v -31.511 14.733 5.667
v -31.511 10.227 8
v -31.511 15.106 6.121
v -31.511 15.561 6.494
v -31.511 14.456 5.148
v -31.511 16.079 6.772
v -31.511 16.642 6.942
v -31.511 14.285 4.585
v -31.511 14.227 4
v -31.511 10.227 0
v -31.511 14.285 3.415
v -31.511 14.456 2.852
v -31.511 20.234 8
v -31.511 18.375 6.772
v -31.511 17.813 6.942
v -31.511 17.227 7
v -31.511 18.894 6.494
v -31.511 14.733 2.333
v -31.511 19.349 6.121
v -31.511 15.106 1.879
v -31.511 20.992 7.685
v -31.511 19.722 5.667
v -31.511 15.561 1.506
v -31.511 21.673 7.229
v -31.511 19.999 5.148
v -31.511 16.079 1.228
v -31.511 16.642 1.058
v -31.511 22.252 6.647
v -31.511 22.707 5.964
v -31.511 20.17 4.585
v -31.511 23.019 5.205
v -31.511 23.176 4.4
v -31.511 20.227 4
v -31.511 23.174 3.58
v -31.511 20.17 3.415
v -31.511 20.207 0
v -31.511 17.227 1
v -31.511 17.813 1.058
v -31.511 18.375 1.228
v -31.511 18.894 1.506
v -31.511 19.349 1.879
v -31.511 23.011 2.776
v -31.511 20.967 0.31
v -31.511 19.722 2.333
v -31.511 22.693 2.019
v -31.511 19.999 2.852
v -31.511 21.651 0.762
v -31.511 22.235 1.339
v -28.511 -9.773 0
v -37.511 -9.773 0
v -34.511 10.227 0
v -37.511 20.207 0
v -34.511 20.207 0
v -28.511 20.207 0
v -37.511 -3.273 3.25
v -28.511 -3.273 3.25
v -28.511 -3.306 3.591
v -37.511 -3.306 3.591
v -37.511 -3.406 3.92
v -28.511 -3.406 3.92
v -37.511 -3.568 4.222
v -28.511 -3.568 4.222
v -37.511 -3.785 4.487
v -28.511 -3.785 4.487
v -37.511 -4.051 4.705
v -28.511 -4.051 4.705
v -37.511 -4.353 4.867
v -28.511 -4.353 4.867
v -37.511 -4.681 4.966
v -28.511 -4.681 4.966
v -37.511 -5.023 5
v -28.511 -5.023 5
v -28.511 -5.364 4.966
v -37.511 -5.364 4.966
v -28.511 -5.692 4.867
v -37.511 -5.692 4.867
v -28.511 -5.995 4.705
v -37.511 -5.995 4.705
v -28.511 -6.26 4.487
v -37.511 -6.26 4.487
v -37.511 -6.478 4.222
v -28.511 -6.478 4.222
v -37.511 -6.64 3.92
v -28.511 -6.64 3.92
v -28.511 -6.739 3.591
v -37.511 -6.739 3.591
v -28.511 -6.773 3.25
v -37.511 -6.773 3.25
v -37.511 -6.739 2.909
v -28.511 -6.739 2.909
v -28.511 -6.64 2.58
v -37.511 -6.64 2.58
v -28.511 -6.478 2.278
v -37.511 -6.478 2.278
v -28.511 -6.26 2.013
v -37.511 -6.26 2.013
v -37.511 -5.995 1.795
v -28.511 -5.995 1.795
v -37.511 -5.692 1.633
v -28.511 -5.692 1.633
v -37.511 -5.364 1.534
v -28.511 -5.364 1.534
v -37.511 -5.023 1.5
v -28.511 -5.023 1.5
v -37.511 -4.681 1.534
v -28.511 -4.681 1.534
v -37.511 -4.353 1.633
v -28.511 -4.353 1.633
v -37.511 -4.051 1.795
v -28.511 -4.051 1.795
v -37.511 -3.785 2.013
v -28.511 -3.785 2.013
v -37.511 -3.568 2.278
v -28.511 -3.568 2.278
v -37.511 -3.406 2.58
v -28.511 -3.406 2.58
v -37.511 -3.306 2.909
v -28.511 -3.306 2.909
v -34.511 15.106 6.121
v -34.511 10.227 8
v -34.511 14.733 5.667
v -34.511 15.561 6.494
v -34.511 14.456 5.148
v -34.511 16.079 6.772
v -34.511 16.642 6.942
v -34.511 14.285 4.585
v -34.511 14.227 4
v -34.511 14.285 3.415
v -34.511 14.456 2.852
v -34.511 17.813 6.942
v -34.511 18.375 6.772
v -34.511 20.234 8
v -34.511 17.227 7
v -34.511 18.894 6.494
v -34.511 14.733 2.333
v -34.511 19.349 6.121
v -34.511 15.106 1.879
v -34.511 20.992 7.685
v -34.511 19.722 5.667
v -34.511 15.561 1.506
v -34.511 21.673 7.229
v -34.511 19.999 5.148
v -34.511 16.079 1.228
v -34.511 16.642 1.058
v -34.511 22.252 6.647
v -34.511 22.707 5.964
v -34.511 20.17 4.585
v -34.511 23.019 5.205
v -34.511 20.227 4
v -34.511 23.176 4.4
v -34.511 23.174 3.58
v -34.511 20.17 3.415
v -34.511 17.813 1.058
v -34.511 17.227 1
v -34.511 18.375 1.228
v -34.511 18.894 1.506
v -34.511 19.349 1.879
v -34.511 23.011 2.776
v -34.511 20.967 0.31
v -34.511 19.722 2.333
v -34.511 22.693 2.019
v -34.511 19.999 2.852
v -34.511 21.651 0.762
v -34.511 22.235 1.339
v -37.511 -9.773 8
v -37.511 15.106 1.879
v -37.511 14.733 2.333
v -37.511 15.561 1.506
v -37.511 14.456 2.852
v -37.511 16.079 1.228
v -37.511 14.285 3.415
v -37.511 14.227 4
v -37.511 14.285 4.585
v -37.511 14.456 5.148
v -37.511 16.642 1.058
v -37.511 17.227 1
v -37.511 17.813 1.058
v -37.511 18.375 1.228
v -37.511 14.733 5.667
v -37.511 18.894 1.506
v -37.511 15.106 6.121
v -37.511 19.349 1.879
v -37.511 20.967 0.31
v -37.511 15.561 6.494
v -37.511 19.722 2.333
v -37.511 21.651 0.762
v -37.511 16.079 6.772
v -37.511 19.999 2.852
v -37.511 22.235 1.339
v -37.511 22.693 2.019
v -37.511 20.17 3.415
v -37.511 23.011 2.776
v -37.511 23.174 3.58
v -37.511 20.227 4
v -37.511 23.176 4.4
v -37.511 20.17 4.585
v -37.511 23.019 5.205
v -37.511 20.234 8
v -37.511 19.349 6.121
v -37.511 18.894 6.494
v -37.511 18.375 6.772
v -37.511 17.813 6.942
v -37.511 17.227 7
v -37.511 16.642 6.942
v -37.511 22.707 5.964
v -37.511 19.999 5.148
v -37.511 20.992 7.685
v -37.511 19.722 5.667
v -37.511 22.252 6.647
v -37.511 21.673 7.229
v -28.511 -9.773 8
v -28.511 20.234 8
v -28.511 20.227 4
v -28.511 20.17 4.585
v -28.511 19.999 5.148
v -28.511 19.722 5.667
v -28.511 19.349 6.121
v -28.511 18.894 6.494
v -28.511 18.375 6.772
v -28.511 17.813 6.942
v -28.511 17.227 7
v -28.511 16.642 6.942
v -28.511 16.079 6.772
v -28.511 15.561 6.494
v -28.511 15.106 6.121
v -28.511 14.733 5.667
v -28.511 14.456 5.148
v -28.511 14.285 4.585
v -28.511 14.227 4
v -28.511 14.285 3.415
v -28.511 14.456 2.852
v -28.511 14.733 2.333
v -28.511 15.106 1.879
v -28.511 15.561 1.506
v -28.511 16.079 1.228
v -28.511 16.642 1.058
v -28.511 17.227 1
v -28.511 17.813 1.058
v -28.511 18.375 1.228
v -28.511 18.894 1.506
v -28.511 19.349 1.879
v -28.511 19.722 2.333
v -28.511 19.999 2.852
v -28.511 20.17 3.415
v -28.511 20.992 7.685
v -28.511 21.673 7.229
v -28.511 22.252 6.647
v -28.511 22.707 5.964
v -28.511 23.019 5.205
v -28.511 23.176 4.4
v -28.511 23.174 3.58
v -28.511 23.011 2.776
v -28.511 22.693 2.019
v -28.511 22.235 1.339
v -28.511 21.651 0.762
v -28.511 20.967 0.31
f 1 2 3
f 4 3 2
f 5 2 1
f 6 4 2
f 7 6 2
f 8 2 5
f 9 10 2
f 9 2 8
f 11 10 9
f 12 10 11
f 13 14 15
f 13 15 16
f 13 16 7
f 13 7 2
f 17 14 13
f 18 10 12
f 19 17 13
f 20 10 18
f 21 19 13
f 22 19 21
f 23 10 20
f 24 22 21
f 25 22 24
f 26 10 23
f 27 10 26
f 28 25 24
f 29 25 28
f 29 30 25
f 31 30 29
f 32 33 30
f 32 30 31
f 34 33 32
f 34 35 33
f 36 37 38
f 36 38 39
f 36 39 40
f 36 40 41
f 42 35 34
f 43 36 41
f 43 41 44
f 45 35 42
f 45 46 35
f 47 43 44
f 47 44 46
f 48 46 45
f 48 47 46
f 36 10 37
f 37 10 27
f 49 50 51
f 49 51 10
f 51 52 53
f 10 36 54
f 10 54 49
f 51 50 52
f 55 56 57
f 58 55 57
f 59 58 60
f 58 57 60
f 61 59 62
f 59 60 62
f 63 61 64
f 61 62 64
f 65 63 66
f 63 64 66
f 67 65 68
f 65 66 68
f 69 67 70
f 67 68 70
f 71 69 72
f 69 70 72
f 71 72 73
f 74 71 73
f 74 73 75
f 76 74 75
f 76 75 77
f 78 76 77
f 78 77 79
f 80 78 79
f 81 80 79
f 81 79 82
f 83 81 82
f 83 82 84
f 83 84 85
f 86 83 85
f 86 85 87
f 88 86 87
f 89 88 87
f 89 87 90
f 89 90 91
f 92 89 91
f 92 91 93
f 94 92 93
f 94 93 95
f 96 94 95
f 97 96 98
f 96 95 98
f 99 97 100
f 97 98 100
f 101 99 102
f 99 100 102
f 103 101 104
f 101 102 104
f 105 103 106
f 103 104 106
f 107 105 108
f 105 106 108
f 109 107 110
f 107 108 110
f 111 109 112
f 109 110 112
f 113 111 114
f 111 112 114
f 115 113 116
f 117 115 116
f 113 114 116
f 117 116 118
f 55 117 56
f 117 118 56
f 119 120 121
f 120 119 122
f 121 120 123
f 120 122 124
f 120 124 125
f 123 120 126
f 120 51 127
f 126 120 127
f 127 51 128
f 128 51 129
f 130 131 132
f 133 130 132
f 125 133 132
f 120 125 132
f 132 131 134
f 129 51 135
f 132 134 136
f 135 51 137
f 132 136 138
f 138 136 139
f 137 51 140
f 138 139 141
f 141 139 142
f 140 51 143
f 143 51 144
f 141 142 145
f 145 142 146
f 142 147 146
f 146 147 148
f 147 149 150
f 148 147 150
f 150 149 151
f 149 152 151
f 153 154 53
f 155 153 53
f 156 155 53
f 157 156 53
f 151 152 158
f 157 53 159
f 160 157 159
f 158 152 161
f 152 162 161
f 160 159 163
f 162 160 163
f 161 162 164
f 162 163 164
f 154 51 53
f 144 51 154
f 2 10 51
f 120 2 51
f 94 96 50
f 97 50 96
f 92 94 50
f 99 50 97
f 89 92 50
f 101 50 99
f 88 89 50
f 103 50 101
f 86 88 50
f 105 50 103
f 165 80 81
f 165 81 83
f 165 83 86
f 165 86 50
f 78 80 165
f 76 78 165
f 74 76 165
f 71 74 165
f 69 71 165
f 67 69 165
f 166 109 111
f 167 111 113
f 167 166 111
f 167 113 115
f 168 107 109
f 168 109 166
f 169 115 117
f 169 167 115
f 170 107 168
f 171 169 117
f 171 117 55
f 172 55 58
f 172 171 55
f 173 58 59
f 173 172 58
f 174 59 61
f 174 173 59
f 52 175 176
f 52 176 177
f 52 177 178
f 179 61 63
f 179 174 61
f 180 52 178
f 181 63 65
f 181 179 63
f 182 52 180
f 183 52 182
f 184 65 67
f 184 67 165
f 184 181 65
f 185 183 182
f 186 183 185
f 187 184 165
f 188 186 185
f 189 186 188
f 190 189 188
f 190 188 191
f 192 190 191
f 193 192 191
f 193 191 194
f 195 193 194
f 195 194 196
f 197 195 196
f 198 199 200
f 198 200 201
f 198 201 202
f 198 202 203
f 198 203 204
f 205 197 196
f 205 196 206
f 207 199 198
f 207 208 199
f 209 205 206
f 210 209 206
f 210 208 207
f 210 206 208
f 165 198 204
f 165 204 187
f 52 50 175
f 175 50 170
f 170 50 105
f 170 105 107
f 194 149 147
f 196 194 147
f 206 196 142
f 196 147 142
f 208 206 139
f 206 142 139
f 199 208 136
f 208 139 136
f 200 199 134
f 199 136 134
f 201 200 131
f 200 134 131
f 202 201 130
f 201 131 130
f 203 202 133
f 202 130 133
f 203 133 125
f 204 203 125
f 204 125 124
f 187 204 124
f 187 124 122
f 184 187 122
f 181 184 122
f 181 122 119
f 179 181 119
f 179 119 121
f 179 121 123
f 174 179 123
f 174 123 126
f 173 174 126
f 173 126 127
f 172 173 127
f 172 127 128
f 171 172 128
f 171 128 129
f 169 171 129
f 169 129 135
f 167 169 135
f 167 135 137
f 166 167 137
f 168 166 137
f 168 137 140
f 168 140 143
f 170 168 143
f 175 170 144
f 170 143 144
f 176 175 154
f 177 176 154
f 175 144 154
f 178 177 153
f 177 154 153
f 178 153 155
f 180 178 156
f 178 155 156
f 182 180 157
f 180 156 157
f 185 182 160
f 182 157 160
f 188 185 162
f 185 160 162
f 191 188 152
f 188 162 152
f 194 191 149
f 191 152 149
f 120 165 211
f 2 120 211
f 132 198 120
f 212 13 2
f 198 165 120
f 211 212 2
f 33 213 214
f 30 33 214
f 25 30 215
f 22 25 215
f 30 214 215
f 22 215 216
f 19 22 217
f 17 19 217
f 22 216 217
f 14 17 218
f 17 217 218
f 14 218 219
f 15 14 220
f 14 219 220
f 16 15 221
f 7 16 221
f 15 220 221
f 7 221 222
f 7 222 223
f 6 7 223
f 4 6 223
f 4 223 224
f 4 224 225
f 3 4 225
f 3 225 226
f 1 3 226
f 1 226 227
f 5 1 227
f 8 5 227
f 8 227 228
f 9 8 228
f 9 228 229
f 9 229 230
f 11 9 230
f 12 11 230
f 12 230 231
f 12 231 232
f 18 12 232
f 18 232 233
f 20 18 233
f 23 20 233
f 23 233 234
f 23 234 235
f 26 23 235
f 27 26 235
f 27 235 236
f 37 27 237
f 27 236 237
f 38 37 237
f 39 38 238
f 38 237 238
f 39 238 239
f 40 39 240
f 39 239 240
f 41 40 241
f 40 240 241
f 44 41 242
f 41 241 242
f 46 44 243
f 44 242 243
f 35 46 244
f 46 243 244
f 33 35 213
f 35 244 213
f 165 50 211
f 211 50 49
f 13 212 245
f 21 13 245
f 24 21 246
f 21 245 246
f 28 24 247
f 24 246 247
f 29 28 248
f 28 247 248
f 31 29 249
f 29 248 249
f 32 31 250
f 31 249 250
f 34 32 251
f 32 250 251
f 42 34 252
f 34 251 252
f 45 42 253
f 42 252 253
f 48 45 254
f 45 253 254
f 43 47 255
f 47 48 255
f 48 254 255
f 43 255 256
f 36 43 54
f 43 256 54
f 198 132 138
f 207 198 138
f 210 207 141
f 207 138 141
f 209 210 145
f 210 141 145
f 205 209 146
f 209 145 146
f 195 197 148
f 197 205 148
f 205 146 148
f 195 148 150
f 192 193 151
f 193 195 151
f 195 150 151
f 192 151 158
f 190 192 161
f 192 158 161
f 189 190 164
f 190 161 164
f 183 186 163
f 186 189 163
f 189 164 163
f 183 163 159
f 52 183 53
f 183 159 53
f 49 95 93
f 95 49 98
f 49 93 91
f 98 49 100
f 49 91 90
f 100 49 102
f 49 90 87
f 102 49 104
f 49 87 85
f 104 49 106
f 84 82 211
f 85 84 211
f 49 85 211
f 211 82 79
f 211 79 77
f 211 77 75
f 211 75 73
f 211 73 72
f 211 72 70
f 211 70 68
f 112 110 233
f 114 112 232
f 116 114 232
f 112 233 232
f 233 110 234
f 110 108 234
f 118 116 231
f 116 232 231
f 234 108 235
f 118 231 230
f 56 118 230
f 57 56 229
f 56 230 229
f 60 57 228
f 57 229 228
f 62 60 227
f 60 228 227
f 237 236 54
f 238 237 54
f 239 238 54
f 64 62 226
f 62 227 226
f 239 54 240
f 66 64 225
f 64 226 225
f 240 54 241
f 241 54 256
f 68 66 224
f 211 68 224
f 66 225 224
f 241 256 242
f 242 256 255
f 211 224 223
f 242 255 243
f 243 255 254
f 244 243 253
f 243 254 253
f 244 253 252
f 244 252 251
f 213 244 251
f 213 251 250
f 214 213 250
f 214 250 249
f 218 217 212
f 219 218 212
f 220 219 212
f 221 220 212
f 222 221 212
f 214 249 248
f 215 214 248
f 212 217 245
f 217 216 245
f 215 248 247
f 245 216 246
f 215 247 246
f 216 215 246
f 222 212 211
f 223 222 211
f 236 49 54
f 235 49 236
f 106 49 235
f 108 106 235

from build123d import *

# Parameters (mm, degrees)
F0_W     = 3
F0_H     = 13
F1_DEPTH = 8
F2_R     = 3
F3_DEPTH = 10
F4_DEPTH = 25
F5_DEPTH = 15
F6_R     = 1.75
F7_DEPTH = 25


with BuildPart() as f1:
    # F0 (on Top) → F1 (new body)
    with BuildSketch(Plane.XY):
        with Locations((-36.0112562776, 16.7272449248)):
            Rectangle(F0_W, F0_H)
        with Locations((-30.0112562776, 16.7272449248)):
            Rectangle(F0_W, F0_H)
        Polygon((-34.5112562776, 10.2272449248), (-37.5112562776, 10.2272449248), (-37.5112562776, 5.2272449248), (-28.5112562776, 5.2272449248), (-28.5112562776, 10.2272449248), (-31.5112562776, 10.2272449248), align=None)
    extrude(amount=F1_DEPTH)

    # F2 (on face) → F3 (cut)
    with BuildSketch(Plane.YZ.offset(-28.5112562776)):
        with Locations((17.2272449248, 4)):
            Circle(F2_R)
    extrude(amount=-F3_DEPTH, mode=Mode.SUBTRACT)

    # F2 (on face) → F4 (cut)
    with BuildSketch(Plane.YZ.offset(-28.5112562776)):
        with BuildLine():
            ThreePointArc((20.2339589596, 8), (23.1952457023, 3.989991066), (20.2070418745, 0))
            Line((20.2070418745, 0), (23.2272449248, 0))
            Line((23.2272449248, 0), (23.2272449248, 8))
            Line((23.2272449248, 8), (20.2339589596, 8))
        make_face()
    extrude(amount=-F4_DEPTH, mode=Mode.SUBTRACT)

    # F5 (add): a face of the model
    f5_faces = [f1.faces().sort_by_distance(p)[0] for p in [
        (-33.0112562776, 5.2272449248, 4),
    ]]
    extrude(f5_faces, amount=F5_DEPTH)

    # F6 (on face) → F7 (cut)
    with BuildSketch(Plane.YZ.offset(-28.5112562776)):
        with Locations((-5.0227550752, 3.25)):
            Circle(F6_R)
    extrude(amount=-F7_DEPTH, mode=Mode.SUBTRACT)


solid = f1.part
